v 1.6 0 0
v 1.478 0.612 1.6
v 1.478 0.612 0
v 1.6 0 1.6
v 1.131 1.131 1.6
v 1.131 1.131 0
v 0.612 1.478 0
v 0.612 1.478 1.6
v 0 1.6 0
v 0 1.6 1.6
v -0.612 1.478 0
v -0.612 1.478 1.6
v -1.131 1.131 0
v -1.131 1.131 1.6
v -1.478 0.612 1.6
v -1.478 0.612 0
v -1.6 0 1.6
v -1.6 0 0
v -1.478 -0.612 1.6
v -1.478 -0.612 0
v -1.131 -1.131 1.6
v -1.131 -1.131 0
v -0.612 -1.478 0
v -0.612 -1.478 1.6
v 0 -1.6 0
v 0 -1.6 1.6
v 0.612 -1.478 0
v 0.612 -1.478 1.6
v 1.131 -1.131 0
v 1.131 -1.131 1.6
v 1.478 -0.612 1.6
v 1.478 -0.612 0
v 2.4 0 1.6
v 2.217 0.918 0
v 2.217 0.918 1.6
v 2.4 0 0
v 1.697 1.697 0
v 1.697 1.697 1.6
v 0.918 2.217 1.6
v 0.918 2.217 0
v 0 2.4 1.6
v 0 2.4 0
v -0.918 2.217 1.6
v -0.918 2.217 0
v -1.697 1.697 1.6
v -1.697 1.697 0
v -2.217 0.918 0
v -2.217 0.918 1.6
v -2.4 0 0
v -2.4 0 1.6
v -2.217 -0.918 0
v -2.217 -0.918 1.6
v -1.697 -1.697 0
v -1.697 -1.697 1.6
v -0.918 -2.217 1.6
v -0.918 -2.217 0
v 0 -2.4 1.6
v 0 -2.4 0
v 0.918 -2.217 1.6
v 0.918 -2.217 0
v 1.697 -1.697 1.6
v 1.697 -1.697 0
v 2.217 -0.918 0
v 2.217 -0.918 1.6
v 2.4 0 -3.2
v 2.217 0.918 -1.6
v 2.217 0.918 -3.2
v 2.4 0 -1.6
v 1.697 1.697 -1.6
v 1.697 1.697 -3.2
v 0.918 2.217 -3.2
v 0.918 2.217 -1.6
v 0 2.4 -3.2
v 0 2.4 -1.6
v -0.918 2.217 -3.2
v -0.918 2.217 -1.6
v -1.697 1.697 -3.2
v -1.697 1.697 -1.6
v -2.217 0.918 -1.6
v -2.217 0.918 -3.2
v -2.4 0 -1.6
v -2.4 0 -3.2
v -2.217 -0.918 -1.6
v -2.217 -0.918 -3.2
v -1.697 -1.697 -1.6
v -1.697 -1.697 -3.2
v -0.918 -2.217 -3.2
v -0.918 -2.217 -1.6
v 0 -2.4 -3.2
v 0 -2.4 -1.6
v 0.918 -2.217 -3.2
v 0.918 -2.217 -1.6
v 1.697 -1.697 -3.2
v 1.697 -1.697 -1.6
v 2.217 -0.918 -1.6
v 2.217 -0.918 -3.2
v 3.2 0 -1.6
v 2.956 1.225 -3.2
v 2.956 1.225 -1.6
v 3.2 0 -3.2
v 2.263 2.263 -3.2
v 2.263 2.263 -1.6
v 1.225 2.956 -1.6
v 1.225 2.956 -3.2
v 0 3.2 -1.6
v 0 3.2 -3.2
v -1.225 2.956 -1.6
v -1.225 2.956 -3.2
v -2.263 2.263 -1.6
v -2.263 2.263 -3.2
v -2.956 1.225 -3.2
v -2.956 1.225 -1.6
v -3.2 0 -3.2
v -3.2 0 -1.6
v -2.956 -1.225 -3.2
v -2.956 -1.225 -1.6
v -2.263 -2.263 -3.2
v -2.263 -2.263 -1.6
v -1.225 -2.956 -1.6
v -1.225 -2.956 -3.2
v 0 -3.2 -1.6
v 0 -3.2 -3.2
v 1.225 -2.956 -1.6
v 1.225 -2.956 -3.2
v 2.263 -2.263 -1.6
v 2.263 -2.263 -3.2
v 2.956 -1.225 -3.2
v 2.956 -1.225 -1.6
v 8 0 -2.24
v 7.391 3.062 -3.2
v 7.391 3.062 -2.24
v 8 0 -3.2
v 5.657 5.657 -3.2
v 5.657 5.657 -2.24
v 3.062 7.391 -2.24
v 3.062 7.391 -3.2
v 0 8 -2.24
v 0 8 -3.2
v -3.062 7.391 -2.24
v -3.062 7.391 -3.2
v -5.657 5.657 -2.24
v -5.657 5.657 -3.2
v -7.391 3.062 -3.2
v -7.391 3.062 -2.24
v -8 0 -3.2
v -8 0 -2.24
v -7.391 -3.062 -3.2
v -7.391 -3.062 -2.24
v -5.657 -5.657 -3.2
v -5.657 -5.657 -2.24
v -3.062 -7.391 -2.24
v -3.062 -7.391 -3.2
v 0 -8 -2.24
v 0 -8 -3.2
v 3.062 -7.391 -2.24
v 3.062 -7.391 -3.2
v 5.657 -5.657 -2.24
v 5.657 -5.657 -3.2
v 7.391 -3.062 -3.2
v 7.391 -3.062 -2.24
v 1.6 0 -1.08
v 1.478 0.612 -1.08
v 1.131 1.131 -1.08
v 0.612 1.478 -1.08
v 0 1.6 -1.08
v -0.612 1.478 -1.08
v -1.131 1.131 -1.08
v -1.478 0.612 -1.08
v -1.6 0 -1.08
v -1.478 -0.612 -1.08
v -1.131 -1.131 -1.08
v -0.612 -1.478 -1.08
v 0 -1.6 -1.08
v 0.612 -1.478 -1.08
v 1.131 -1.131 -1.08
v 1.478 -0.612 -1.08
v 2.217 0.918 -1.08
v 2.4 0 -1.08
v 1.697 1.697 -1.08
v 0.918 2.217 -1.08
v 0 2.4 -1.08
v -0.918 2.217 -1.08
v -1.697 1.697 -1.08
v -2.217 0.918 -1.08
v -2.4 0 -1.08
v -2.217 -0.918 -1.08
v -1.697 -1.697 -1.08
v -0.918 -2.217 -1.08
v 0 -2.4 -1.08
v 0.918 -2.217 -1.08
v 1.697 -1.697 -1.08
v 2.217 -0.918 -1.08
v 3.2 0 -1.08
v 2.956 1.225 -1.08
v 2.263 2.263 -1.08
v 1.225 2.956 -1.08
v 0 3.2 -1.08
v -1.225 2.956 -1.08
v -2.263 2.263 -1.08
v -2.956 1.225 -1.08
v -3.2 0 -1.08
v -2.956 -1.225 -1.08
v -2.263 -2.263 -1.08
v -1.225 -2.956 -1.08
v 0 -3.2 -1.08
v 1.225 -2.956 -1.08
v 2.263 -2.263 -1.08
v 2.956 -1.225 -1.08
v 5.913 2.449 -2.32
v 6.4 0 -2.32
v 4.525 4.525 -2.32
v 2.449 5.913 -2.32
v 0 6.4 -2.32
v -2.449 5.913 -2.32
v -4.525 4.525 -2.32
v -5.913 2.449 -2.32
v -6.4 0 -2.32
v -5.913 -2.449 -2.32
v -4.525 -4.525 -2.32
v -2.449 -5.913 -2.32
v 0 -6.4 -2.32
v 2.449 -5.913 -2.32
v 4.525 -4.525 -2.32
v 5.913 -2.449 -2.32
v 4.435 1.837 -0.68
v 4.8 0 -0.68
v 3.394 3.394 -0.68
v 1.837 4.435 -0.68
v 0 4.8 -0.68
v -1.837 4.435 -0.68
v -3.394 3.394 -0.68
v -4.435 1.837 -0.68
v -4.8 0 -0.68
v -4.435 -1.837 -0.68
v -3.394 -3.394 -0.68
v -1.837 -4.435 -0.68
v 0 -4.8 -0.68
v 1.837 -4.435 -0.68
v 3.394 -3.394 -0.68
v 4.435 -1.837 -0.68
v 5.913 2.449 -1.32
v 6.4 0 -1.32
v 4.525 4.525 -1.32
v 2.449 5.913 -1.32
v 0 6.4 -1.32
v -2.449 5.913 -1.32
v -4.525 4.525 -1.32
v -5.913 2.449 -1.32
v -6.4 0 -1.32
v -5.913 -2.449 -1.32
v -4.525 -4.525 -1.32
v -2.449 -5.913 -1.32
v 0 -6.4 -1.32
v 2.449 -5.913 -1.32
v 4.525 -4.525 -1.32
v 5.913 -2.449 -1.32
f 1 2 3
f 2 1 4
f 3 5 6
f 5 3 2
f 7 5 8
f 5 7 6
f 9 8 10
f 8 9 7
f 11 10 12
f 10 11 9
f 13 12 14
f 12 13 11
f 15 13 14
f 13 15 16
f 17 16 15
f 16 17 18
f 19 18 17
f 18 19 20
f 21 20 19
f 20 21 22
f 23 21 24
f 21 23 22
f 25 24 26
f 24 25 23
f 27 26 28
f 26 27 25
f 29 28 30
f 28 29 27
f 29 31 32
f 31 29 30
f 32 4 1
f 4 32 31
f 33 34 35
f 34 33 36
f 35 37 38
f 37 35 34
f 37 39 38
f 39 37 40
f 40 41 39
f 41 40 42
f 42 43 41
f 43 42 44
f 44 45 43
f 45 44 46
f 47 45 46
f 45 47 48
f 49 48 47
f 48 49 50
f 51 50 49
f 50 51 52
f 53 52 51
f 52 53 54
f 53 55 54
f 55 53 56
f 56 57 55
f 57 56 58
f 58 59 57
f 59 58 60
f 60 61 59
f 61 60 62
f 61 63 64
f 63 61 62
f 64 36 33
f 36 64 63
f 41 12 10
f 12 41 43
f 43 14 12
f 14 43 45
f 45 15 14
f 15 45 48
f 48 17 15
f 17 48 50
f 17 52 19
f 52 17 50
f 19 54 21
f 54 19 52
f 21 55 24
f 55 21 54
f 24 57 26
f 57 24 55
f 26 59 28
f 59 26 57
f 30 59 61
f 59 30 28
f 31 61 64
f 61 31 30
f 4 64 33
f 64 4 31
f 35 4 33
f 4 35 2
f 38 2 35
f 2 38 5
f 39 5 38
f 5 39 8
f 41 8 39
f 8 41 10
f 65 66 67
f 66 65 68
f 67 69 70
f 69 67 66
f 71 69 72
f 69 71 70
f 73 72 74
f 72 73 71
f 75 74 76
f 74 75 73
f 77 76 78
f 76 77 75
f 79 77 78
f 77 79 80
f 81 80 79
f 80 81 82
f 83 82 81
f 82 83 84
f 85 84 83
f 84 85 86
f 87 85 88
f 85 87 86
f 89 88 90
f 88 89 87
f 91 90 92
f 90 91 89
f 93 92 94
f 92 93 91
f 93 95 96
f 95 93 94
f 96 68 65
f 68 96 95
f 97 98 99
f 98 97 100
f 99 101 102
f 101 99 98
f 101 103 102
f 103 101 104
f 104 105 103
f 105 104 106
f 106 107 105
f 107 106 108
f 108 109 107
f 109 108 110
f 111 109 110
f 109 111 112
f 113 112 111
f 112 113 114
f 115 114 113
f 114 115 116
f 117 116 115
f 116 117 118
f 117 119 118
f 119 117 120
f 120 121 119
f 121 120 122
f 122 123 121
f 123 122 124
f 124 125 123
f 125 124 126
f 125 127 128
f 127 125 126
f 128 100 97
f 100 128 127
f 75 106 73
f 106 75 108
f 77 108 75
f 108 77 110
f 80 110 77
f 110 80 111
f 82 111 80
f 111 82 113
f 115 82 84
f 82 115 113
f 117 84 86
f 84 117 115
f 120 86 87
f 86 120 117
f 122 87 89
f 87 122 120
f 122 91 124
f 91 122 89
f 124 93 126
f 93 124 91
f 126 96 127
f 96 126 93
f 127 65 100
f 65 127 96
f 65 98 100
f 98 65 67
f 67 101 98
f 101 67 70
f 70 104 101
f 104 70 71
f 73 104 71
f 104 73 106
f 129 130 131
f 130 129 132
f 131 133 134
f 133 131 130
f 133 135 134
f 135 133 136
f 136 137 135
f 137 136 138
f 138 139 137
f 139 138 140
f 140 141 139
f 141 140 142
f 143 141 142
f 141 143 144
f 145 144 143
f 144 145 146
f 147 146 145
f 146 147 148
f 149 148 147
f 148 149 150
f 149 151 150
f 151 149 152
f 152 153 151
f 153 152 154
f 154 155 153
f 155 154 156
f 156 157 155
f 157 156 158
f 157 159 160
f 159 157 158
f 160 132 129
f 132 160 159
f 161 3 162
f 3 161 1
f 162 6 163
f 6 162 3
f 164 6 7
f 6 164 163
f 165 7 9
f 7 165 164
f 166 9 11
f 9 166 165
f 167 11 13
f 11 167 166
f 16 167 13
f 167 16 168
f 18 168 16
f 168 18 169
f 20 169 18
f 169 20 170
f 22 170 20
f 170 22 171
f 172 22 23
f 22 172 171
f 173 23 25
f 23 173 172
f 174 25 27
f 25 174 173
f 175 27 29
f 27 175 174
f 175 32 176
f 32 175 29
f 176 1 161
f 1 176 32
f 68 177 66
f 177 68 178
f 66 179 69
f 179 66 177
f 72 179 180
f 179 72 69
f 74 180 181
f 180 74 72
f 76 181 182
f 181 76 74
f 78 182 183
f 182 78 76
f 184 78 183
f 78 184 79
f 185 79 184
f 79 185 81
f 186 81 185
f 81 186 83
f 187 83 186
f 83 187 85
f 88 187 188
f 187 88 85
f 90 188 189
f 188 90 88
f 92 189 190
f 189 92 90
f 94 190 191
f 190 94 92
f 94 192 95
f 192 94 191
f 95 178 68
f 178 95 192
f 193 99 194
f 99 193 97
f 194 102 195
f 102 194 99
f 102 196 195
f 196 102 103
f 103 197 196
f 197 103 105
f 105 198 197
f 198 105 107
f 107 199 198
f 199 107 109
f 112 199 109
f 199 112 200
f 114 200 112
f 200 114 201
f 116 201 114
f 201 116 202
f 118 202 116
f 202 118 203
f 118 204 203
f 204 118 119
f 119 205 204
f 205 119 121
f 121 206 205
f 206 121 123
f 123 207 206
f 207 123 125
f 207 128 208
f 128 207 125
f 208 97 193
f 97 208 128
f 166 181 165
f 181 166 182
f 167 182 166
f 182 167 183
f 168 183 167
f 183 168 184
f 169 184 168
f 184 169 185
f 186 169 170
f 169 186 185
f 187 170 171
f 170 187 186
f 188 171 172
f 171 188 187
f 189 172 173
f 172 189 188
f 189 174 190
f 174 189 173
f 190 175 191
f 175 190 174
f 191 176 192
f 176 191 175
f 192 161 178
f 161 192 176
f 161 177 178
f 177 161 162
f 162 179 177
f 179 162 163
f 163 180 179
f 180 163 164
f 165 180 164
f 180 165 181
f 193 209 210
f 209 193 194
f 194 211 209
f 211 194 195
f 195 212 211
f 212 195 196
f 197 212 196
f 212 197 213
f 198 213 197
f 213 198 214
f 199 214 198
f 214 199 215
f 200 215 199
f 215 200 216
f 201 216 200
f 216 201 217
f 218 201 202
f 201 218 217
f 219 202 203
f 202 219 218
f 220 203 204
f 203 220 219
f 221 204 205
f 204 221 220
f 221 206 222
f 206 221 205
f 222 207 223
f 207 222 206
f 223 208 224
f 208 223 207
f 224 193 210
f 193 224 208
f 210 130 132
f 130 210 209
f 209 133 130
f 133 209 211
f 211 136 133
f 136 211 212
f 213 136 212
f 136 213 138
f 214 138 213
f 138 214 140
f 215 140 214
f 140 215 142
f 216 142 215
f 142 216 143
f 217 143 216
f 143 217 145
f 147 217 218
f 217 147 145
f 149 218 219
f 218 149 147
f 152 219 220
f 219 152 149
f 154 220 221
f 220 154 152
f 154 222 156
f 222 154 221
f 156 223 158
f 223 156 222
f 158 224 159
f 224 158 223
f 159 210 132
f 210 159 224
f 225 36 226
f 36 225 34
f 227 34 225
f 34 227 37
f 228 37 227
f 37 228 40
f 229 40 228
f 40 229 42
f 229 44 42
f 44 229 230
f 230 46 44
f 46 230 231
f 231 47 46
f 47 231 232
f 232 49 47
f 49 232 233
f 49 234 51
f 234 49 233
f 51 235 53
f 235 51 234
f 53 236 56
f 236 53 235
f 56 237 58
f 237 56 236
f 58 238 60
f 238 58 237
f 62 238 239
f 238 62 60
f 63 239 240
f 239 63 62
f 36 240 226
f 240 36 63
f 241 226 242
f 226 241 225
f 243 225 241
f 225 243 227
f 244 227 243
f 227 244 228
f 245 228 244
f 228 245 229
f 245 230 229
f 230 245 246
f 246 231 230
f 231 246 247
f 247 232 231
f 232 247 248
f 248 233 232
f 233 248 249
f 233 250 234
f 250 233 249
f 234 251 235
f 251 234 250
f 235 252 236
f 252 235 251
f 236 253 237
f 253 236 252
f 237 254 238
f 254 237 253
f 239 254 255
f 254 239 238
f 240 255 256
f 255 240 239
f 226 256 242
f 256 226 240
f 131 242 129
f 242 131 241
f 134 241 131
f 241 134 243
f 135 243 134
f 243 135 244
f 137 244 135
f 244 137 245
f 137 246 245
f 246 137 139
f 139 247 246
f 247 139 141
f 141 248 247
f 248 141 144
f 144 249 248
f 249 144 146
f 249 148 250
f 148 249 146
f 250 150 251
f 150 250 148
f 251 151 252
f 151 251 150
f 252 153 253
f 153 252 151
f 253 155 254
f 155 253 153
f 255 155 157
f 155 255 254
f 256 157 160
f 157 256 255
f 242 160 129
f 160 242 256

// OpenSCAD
use <../lib.scad>
use <4740.scad>
$fa=1; $fs=0.2;
function ldraw_lib__30063(realsolid=false) = [
// 0 =Dish  2 x  2 Inverted
// 0 Name: 30063.dat
// 0 Author: Rolf Osterthun [Rolf]
// 0 !LDRAW_ORG Part Alias UPDATE 2013-02
// 0 !LICENSE Licensed under CC BY 2.0 and CC BY 4.0 : see CAreadme.txt
// 
// 0 BFC CERTIFY CCW
  [0,"BFC","CERTIFY"],
  [0,"BFC","CCW"],
// 
// 0 !HISTORY 2013-12-23 [PTadmin] Official Update 2013-02
// 
// 
// 0 // Alias of 4740
// 0 // Part 30063 is the transparent counterpart of 4740
// 
// 1 16 0 0 0 1 0 0 0 1 0 0 0 1 4740.dat
  [1,16,0,0,0,1,0,0,0,1,0,0,0,1, ldraw_lib__4740(realsolid)],
];
module ldraw_lib__30063(step=0, col=false, unit=2/5, alt=false, line=0.2, solid=!$preview)
    makepoly(ldraw_lib__30063(solid), step=step, col=col, unit=unit, alt=alt, line=line, solid=solid);
ldraw_lib__30063(line=0.2);
